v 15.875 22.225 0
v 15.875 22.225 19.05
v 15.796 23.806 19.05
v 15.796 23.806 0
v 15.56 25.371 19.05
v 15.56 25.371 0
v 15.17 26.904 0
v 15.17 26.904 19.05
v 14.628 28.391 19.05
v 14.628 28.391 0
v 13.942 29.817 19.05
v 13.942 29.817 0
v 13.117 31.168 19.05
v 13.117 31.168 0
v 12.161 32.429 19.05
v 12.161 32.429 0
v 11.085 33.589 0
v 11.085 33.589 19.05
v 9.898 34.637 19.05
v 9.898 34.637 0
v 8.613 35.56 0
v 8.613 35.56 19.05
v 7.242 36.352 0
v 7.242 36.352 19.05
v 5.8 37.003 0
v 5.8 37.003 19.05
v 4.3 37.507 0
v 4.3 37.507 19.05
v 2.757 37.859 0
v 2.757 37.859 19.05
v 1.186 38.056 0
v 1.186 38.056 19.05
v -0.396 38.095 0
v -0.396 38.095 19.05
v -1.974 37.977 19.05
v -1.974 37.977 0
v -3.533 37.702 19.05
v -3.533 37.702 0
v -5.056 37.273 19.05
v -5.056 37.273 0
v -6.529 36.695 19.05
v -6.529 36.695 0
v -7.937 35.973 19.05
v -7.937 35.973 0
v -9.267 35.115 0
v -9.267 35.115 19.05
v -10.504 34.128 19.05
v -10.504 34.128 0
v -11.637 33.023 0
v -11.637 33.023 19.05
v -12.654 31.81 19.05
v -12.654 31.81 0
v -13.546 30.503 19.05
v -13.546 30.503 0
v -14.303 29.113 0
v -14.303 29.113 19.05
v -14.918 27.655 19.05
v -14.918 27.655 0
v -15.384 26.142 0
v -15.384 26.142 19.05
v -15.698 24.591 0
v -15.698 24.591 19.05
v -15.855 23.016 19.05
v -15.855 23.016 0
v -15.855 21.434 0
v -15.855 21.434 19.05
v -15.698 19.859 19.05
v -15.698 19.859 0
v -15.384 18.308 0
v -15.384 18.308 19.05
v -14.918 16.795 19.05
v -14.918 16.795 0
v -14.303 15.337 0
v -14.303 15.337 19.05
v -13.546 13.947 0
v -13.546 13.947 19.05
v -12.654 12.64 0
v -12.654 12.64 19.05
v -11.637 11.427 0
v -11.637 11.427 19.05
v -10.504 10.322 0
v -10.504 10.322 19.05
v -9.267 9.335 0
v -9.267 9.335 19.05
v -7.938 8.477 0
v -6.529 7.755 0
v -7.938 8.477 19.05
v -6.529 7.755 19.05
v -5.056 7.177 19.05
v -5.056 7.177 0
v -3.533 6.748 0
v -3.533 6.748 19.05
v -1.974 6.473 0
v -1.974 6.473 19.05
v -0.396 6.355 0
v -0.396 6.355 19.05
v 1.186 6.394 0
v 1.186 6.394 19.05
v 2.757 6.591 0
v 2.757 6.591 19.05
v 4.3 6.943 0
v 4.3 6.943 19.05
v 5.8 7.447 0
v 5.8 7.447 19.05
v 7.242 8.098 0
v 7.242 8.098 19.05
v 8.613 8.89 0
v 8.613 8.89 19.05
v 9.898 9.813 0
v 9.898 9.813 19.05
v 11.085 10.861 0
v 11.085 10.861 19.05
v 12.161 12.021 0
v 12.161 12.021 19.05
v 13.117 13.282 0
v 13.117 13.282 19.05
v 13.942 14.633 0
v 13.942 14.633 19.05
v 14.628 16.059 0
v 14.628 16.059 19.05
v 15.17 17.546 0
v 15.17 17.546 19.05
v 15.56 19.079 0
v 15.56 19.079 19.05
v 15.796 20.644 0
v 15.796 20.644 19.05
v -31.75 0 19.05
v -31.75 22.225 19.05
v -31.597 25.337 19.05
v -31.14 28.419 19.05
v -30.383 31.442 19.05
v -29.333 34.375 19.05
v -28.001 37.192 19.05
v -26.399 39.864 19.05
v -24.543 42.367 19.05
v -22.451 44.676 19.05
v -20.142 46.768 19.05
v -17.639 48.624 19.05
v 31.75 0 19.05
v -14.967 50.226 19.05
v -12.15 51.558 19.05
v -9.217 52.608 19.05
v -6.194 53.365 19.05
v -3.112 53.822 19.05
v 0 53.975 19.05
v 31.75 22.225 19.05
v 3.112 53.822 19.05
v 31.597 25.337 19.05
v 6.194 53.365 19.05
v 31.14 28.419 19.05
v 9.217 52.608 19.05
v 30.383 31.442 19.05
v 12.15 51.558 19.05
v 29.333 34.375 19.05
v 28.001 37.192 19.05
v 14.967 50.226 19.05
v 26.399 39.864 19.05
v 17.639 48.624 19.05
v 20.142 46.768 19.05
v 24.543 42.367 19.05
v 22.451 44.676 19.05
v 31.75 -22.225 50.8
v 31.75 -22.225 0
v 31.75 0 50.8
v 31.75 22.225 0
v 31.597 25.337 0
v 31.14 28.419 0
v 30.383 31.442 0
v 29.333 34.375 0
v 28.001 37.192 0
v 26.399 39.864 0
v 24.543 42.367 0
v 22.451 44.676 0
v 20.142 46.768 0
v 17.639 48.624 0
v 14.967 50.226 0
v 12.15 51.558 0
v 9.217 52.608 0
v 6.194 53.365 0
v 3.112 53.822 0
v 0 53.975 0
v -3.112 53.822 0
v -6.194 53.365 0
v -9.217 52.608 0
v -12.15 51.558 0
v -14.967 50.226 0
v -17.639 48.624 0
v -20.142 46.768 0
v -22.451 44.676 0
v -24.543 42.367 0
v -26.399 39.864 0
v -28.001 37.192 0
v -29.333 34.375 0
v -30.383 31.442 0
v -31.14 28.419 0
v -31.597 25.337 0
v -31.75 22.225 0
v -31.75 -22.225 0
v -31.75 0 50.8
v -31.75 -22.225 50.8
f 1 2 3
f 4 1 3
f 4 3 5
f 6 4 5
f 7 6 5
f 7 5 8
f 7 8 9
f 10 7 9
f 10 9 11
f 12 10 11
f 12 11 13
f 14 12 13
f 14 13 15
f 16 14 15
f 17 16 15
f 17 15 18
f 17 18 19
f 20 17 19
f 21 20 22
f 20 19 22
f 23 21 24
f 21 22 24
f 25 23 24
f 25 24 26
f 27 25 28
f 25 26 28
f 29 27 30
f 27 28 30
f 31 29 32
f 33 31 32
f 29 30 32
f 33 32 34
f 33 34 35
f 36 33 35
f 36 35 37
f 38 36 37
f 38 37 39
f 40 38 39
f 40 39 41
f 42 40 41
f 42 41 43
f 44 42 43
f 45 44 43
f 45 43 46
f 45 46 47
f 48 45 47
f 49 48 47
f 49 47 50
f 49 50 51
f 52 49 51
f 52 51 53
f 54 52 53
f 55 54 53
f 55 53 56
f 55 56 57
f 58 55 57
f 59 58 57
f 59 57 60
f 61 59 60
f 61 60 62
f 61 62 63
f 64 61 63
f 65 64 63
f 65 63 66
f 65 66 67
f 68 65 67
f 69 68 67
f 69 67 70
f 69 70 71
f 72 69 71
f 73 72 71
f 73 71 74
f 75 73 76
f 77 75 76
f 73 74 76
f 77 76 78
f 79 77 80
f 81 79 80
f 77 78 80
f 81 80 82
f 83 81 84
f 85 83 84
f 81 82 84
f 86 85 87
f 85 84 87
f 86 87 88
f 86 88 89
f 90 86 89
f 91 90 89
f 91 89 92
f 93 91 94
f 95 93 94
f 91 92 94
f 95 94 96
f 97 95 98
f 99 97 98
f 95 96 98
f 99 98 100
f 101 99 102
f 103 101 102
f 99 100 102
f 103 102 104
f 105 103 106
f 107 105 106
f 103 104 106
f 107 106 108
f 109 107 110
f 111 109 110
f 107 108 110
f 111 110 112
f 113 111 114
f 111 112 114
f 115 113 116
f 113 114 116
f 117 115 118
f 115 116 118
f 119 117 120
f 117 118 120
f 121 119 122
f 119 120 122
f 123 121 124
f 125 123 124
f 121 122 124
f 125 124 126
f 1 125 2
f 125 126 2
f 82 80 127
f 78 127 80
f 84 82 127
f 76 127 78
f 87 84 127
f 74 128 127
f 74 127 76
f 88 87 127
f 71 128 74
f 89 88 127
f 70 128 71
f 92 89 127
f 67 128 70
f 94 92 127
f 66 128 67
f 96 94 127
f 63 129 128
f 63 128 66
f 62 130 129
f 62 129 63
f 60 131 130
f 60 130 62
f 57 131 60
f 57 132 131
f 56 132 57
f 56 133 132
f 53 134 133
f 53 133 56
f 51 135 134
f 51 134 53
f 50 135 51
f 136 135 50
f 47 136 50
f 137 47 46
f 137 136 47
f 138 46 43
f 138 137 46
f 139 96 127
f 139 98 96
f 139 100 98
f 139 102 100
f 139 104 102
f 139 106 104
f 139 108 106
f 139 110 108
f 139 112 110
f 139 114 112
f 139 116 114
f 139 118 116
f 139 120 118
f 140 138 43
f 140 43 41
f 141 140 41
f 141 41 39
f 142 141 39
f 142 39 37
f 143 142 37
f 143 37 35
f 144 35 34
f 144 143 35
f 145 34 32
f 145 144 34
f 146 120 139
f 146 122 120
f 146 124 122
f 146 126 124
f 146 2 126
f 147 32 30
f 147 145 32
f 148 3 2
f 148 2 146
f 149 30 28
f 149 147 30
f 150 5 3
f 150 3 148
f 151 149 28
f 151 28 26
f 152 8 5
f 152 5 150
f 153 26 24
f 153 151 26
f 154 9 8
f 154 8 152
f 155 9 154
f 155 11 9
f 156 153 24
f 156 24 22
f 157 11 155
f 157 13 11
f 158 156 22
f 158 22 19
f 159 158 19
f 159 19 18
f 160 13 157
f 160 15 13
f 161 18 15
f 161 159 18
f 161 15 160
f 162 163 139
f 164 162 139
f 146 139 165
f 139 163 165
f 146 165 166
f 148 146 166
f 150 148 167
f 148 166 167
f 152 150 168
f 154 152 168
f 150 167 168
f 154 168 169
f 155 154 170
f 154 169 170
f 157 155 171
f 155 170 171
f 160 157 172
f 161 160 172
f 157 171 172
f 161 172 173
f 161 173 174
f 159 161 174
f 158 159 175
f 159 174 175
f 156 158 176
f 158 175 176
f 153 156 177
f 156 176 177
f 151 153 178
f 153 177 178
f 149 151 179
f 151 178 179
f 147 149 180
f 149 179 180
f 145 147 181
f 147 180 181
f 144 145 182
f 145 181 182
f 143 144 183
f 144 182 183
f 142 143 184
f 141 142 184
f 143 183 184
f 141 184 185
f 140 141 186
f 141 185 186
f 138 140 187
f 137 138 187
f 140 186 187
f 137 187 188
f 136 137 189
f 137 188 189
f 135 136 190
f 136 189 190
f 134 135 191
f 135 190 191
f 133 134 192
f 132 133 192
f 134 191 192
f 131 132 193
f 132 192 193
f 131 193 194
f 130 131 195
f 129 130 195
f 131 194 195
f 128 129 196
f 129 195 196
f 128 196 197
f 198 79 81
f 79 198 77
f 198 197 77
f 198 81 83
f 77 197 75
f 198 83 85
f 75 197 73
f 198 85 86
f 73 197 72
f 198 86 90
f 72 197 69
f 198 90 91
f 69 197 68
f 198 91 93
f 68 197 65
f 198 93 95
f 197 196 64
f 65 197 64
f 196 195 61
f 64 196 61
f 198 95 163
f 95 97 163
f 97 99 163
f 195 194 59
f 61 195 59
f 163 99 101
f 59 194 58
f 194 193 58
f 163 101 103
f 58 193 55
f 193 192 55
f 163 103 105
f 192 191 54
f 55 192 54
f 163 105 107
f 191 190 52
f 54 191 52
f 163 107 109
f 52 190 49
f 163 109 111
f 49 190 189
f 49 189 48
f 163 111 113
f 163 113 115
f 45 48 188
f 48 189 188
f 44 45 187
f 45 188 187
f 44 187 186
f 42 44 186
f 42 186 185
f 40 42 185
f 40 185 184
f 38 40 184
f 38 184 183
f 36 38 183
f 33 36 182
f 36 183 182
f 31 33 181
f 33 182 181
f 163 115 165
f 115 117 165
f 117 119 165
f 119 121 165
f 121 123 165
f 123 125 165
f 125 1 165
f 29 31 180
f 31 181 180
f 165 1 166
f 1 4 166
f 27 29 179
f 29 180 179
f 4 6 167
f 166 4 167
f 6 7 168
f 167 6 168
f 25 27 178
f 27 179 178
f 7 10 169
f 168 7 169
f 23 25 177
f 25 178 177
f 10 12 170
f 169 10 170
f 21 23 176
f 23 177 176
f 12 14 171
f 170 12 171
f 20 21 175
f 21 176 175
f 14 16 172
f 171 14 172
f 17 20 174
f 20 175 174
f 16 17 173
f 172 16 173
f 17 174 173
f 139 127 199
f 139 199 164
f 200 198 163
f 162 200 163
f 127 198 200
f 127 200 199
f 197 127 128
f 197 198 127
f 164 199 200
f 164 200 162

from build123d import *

# Parameters (mm, degrees)
F0_W     = 63.5
F0_H     = 44.45
F1_DEPTH = 19.05
F2_R     = 15.875
F3_DEPTH = 25.4
F4_W     = 63.5
F4_H     = 22.225
F5_DEPTH = 50.8


with BuildPart() as f1:
    # F0 (on Top) → F1 (new body)
    with BuildSketch(Plane.XY):
        Rectangle(F0_W, F0_H)
        with BuildLine():
            Line((-31.75, 22.225), (31.75, 22.225))
            ThreePointArc((31.75, 22.225), (0, 53.975), (-31.75, 22.225))
        make_face()
    extrude(amount=F1_DEPTH)

    # F2 (on face) → F3 (cut)
    with BuildSketch(Plane.XY.offset(19.05)):
        with Locations((0, 22.225)):
            Circle(F2_R)
    extrude(amount=-F3_DEPTH, mode=Mode.SUBTRACT)

    # F4 (on Top) → F5 (join)
    with BuildSketch(Plane.XY):
        with Locations((0, -11.1125)):
            Rectangle(F4_W, F4_H)
    extrude(amount=F5_DEPTH)


solid = f1.part
